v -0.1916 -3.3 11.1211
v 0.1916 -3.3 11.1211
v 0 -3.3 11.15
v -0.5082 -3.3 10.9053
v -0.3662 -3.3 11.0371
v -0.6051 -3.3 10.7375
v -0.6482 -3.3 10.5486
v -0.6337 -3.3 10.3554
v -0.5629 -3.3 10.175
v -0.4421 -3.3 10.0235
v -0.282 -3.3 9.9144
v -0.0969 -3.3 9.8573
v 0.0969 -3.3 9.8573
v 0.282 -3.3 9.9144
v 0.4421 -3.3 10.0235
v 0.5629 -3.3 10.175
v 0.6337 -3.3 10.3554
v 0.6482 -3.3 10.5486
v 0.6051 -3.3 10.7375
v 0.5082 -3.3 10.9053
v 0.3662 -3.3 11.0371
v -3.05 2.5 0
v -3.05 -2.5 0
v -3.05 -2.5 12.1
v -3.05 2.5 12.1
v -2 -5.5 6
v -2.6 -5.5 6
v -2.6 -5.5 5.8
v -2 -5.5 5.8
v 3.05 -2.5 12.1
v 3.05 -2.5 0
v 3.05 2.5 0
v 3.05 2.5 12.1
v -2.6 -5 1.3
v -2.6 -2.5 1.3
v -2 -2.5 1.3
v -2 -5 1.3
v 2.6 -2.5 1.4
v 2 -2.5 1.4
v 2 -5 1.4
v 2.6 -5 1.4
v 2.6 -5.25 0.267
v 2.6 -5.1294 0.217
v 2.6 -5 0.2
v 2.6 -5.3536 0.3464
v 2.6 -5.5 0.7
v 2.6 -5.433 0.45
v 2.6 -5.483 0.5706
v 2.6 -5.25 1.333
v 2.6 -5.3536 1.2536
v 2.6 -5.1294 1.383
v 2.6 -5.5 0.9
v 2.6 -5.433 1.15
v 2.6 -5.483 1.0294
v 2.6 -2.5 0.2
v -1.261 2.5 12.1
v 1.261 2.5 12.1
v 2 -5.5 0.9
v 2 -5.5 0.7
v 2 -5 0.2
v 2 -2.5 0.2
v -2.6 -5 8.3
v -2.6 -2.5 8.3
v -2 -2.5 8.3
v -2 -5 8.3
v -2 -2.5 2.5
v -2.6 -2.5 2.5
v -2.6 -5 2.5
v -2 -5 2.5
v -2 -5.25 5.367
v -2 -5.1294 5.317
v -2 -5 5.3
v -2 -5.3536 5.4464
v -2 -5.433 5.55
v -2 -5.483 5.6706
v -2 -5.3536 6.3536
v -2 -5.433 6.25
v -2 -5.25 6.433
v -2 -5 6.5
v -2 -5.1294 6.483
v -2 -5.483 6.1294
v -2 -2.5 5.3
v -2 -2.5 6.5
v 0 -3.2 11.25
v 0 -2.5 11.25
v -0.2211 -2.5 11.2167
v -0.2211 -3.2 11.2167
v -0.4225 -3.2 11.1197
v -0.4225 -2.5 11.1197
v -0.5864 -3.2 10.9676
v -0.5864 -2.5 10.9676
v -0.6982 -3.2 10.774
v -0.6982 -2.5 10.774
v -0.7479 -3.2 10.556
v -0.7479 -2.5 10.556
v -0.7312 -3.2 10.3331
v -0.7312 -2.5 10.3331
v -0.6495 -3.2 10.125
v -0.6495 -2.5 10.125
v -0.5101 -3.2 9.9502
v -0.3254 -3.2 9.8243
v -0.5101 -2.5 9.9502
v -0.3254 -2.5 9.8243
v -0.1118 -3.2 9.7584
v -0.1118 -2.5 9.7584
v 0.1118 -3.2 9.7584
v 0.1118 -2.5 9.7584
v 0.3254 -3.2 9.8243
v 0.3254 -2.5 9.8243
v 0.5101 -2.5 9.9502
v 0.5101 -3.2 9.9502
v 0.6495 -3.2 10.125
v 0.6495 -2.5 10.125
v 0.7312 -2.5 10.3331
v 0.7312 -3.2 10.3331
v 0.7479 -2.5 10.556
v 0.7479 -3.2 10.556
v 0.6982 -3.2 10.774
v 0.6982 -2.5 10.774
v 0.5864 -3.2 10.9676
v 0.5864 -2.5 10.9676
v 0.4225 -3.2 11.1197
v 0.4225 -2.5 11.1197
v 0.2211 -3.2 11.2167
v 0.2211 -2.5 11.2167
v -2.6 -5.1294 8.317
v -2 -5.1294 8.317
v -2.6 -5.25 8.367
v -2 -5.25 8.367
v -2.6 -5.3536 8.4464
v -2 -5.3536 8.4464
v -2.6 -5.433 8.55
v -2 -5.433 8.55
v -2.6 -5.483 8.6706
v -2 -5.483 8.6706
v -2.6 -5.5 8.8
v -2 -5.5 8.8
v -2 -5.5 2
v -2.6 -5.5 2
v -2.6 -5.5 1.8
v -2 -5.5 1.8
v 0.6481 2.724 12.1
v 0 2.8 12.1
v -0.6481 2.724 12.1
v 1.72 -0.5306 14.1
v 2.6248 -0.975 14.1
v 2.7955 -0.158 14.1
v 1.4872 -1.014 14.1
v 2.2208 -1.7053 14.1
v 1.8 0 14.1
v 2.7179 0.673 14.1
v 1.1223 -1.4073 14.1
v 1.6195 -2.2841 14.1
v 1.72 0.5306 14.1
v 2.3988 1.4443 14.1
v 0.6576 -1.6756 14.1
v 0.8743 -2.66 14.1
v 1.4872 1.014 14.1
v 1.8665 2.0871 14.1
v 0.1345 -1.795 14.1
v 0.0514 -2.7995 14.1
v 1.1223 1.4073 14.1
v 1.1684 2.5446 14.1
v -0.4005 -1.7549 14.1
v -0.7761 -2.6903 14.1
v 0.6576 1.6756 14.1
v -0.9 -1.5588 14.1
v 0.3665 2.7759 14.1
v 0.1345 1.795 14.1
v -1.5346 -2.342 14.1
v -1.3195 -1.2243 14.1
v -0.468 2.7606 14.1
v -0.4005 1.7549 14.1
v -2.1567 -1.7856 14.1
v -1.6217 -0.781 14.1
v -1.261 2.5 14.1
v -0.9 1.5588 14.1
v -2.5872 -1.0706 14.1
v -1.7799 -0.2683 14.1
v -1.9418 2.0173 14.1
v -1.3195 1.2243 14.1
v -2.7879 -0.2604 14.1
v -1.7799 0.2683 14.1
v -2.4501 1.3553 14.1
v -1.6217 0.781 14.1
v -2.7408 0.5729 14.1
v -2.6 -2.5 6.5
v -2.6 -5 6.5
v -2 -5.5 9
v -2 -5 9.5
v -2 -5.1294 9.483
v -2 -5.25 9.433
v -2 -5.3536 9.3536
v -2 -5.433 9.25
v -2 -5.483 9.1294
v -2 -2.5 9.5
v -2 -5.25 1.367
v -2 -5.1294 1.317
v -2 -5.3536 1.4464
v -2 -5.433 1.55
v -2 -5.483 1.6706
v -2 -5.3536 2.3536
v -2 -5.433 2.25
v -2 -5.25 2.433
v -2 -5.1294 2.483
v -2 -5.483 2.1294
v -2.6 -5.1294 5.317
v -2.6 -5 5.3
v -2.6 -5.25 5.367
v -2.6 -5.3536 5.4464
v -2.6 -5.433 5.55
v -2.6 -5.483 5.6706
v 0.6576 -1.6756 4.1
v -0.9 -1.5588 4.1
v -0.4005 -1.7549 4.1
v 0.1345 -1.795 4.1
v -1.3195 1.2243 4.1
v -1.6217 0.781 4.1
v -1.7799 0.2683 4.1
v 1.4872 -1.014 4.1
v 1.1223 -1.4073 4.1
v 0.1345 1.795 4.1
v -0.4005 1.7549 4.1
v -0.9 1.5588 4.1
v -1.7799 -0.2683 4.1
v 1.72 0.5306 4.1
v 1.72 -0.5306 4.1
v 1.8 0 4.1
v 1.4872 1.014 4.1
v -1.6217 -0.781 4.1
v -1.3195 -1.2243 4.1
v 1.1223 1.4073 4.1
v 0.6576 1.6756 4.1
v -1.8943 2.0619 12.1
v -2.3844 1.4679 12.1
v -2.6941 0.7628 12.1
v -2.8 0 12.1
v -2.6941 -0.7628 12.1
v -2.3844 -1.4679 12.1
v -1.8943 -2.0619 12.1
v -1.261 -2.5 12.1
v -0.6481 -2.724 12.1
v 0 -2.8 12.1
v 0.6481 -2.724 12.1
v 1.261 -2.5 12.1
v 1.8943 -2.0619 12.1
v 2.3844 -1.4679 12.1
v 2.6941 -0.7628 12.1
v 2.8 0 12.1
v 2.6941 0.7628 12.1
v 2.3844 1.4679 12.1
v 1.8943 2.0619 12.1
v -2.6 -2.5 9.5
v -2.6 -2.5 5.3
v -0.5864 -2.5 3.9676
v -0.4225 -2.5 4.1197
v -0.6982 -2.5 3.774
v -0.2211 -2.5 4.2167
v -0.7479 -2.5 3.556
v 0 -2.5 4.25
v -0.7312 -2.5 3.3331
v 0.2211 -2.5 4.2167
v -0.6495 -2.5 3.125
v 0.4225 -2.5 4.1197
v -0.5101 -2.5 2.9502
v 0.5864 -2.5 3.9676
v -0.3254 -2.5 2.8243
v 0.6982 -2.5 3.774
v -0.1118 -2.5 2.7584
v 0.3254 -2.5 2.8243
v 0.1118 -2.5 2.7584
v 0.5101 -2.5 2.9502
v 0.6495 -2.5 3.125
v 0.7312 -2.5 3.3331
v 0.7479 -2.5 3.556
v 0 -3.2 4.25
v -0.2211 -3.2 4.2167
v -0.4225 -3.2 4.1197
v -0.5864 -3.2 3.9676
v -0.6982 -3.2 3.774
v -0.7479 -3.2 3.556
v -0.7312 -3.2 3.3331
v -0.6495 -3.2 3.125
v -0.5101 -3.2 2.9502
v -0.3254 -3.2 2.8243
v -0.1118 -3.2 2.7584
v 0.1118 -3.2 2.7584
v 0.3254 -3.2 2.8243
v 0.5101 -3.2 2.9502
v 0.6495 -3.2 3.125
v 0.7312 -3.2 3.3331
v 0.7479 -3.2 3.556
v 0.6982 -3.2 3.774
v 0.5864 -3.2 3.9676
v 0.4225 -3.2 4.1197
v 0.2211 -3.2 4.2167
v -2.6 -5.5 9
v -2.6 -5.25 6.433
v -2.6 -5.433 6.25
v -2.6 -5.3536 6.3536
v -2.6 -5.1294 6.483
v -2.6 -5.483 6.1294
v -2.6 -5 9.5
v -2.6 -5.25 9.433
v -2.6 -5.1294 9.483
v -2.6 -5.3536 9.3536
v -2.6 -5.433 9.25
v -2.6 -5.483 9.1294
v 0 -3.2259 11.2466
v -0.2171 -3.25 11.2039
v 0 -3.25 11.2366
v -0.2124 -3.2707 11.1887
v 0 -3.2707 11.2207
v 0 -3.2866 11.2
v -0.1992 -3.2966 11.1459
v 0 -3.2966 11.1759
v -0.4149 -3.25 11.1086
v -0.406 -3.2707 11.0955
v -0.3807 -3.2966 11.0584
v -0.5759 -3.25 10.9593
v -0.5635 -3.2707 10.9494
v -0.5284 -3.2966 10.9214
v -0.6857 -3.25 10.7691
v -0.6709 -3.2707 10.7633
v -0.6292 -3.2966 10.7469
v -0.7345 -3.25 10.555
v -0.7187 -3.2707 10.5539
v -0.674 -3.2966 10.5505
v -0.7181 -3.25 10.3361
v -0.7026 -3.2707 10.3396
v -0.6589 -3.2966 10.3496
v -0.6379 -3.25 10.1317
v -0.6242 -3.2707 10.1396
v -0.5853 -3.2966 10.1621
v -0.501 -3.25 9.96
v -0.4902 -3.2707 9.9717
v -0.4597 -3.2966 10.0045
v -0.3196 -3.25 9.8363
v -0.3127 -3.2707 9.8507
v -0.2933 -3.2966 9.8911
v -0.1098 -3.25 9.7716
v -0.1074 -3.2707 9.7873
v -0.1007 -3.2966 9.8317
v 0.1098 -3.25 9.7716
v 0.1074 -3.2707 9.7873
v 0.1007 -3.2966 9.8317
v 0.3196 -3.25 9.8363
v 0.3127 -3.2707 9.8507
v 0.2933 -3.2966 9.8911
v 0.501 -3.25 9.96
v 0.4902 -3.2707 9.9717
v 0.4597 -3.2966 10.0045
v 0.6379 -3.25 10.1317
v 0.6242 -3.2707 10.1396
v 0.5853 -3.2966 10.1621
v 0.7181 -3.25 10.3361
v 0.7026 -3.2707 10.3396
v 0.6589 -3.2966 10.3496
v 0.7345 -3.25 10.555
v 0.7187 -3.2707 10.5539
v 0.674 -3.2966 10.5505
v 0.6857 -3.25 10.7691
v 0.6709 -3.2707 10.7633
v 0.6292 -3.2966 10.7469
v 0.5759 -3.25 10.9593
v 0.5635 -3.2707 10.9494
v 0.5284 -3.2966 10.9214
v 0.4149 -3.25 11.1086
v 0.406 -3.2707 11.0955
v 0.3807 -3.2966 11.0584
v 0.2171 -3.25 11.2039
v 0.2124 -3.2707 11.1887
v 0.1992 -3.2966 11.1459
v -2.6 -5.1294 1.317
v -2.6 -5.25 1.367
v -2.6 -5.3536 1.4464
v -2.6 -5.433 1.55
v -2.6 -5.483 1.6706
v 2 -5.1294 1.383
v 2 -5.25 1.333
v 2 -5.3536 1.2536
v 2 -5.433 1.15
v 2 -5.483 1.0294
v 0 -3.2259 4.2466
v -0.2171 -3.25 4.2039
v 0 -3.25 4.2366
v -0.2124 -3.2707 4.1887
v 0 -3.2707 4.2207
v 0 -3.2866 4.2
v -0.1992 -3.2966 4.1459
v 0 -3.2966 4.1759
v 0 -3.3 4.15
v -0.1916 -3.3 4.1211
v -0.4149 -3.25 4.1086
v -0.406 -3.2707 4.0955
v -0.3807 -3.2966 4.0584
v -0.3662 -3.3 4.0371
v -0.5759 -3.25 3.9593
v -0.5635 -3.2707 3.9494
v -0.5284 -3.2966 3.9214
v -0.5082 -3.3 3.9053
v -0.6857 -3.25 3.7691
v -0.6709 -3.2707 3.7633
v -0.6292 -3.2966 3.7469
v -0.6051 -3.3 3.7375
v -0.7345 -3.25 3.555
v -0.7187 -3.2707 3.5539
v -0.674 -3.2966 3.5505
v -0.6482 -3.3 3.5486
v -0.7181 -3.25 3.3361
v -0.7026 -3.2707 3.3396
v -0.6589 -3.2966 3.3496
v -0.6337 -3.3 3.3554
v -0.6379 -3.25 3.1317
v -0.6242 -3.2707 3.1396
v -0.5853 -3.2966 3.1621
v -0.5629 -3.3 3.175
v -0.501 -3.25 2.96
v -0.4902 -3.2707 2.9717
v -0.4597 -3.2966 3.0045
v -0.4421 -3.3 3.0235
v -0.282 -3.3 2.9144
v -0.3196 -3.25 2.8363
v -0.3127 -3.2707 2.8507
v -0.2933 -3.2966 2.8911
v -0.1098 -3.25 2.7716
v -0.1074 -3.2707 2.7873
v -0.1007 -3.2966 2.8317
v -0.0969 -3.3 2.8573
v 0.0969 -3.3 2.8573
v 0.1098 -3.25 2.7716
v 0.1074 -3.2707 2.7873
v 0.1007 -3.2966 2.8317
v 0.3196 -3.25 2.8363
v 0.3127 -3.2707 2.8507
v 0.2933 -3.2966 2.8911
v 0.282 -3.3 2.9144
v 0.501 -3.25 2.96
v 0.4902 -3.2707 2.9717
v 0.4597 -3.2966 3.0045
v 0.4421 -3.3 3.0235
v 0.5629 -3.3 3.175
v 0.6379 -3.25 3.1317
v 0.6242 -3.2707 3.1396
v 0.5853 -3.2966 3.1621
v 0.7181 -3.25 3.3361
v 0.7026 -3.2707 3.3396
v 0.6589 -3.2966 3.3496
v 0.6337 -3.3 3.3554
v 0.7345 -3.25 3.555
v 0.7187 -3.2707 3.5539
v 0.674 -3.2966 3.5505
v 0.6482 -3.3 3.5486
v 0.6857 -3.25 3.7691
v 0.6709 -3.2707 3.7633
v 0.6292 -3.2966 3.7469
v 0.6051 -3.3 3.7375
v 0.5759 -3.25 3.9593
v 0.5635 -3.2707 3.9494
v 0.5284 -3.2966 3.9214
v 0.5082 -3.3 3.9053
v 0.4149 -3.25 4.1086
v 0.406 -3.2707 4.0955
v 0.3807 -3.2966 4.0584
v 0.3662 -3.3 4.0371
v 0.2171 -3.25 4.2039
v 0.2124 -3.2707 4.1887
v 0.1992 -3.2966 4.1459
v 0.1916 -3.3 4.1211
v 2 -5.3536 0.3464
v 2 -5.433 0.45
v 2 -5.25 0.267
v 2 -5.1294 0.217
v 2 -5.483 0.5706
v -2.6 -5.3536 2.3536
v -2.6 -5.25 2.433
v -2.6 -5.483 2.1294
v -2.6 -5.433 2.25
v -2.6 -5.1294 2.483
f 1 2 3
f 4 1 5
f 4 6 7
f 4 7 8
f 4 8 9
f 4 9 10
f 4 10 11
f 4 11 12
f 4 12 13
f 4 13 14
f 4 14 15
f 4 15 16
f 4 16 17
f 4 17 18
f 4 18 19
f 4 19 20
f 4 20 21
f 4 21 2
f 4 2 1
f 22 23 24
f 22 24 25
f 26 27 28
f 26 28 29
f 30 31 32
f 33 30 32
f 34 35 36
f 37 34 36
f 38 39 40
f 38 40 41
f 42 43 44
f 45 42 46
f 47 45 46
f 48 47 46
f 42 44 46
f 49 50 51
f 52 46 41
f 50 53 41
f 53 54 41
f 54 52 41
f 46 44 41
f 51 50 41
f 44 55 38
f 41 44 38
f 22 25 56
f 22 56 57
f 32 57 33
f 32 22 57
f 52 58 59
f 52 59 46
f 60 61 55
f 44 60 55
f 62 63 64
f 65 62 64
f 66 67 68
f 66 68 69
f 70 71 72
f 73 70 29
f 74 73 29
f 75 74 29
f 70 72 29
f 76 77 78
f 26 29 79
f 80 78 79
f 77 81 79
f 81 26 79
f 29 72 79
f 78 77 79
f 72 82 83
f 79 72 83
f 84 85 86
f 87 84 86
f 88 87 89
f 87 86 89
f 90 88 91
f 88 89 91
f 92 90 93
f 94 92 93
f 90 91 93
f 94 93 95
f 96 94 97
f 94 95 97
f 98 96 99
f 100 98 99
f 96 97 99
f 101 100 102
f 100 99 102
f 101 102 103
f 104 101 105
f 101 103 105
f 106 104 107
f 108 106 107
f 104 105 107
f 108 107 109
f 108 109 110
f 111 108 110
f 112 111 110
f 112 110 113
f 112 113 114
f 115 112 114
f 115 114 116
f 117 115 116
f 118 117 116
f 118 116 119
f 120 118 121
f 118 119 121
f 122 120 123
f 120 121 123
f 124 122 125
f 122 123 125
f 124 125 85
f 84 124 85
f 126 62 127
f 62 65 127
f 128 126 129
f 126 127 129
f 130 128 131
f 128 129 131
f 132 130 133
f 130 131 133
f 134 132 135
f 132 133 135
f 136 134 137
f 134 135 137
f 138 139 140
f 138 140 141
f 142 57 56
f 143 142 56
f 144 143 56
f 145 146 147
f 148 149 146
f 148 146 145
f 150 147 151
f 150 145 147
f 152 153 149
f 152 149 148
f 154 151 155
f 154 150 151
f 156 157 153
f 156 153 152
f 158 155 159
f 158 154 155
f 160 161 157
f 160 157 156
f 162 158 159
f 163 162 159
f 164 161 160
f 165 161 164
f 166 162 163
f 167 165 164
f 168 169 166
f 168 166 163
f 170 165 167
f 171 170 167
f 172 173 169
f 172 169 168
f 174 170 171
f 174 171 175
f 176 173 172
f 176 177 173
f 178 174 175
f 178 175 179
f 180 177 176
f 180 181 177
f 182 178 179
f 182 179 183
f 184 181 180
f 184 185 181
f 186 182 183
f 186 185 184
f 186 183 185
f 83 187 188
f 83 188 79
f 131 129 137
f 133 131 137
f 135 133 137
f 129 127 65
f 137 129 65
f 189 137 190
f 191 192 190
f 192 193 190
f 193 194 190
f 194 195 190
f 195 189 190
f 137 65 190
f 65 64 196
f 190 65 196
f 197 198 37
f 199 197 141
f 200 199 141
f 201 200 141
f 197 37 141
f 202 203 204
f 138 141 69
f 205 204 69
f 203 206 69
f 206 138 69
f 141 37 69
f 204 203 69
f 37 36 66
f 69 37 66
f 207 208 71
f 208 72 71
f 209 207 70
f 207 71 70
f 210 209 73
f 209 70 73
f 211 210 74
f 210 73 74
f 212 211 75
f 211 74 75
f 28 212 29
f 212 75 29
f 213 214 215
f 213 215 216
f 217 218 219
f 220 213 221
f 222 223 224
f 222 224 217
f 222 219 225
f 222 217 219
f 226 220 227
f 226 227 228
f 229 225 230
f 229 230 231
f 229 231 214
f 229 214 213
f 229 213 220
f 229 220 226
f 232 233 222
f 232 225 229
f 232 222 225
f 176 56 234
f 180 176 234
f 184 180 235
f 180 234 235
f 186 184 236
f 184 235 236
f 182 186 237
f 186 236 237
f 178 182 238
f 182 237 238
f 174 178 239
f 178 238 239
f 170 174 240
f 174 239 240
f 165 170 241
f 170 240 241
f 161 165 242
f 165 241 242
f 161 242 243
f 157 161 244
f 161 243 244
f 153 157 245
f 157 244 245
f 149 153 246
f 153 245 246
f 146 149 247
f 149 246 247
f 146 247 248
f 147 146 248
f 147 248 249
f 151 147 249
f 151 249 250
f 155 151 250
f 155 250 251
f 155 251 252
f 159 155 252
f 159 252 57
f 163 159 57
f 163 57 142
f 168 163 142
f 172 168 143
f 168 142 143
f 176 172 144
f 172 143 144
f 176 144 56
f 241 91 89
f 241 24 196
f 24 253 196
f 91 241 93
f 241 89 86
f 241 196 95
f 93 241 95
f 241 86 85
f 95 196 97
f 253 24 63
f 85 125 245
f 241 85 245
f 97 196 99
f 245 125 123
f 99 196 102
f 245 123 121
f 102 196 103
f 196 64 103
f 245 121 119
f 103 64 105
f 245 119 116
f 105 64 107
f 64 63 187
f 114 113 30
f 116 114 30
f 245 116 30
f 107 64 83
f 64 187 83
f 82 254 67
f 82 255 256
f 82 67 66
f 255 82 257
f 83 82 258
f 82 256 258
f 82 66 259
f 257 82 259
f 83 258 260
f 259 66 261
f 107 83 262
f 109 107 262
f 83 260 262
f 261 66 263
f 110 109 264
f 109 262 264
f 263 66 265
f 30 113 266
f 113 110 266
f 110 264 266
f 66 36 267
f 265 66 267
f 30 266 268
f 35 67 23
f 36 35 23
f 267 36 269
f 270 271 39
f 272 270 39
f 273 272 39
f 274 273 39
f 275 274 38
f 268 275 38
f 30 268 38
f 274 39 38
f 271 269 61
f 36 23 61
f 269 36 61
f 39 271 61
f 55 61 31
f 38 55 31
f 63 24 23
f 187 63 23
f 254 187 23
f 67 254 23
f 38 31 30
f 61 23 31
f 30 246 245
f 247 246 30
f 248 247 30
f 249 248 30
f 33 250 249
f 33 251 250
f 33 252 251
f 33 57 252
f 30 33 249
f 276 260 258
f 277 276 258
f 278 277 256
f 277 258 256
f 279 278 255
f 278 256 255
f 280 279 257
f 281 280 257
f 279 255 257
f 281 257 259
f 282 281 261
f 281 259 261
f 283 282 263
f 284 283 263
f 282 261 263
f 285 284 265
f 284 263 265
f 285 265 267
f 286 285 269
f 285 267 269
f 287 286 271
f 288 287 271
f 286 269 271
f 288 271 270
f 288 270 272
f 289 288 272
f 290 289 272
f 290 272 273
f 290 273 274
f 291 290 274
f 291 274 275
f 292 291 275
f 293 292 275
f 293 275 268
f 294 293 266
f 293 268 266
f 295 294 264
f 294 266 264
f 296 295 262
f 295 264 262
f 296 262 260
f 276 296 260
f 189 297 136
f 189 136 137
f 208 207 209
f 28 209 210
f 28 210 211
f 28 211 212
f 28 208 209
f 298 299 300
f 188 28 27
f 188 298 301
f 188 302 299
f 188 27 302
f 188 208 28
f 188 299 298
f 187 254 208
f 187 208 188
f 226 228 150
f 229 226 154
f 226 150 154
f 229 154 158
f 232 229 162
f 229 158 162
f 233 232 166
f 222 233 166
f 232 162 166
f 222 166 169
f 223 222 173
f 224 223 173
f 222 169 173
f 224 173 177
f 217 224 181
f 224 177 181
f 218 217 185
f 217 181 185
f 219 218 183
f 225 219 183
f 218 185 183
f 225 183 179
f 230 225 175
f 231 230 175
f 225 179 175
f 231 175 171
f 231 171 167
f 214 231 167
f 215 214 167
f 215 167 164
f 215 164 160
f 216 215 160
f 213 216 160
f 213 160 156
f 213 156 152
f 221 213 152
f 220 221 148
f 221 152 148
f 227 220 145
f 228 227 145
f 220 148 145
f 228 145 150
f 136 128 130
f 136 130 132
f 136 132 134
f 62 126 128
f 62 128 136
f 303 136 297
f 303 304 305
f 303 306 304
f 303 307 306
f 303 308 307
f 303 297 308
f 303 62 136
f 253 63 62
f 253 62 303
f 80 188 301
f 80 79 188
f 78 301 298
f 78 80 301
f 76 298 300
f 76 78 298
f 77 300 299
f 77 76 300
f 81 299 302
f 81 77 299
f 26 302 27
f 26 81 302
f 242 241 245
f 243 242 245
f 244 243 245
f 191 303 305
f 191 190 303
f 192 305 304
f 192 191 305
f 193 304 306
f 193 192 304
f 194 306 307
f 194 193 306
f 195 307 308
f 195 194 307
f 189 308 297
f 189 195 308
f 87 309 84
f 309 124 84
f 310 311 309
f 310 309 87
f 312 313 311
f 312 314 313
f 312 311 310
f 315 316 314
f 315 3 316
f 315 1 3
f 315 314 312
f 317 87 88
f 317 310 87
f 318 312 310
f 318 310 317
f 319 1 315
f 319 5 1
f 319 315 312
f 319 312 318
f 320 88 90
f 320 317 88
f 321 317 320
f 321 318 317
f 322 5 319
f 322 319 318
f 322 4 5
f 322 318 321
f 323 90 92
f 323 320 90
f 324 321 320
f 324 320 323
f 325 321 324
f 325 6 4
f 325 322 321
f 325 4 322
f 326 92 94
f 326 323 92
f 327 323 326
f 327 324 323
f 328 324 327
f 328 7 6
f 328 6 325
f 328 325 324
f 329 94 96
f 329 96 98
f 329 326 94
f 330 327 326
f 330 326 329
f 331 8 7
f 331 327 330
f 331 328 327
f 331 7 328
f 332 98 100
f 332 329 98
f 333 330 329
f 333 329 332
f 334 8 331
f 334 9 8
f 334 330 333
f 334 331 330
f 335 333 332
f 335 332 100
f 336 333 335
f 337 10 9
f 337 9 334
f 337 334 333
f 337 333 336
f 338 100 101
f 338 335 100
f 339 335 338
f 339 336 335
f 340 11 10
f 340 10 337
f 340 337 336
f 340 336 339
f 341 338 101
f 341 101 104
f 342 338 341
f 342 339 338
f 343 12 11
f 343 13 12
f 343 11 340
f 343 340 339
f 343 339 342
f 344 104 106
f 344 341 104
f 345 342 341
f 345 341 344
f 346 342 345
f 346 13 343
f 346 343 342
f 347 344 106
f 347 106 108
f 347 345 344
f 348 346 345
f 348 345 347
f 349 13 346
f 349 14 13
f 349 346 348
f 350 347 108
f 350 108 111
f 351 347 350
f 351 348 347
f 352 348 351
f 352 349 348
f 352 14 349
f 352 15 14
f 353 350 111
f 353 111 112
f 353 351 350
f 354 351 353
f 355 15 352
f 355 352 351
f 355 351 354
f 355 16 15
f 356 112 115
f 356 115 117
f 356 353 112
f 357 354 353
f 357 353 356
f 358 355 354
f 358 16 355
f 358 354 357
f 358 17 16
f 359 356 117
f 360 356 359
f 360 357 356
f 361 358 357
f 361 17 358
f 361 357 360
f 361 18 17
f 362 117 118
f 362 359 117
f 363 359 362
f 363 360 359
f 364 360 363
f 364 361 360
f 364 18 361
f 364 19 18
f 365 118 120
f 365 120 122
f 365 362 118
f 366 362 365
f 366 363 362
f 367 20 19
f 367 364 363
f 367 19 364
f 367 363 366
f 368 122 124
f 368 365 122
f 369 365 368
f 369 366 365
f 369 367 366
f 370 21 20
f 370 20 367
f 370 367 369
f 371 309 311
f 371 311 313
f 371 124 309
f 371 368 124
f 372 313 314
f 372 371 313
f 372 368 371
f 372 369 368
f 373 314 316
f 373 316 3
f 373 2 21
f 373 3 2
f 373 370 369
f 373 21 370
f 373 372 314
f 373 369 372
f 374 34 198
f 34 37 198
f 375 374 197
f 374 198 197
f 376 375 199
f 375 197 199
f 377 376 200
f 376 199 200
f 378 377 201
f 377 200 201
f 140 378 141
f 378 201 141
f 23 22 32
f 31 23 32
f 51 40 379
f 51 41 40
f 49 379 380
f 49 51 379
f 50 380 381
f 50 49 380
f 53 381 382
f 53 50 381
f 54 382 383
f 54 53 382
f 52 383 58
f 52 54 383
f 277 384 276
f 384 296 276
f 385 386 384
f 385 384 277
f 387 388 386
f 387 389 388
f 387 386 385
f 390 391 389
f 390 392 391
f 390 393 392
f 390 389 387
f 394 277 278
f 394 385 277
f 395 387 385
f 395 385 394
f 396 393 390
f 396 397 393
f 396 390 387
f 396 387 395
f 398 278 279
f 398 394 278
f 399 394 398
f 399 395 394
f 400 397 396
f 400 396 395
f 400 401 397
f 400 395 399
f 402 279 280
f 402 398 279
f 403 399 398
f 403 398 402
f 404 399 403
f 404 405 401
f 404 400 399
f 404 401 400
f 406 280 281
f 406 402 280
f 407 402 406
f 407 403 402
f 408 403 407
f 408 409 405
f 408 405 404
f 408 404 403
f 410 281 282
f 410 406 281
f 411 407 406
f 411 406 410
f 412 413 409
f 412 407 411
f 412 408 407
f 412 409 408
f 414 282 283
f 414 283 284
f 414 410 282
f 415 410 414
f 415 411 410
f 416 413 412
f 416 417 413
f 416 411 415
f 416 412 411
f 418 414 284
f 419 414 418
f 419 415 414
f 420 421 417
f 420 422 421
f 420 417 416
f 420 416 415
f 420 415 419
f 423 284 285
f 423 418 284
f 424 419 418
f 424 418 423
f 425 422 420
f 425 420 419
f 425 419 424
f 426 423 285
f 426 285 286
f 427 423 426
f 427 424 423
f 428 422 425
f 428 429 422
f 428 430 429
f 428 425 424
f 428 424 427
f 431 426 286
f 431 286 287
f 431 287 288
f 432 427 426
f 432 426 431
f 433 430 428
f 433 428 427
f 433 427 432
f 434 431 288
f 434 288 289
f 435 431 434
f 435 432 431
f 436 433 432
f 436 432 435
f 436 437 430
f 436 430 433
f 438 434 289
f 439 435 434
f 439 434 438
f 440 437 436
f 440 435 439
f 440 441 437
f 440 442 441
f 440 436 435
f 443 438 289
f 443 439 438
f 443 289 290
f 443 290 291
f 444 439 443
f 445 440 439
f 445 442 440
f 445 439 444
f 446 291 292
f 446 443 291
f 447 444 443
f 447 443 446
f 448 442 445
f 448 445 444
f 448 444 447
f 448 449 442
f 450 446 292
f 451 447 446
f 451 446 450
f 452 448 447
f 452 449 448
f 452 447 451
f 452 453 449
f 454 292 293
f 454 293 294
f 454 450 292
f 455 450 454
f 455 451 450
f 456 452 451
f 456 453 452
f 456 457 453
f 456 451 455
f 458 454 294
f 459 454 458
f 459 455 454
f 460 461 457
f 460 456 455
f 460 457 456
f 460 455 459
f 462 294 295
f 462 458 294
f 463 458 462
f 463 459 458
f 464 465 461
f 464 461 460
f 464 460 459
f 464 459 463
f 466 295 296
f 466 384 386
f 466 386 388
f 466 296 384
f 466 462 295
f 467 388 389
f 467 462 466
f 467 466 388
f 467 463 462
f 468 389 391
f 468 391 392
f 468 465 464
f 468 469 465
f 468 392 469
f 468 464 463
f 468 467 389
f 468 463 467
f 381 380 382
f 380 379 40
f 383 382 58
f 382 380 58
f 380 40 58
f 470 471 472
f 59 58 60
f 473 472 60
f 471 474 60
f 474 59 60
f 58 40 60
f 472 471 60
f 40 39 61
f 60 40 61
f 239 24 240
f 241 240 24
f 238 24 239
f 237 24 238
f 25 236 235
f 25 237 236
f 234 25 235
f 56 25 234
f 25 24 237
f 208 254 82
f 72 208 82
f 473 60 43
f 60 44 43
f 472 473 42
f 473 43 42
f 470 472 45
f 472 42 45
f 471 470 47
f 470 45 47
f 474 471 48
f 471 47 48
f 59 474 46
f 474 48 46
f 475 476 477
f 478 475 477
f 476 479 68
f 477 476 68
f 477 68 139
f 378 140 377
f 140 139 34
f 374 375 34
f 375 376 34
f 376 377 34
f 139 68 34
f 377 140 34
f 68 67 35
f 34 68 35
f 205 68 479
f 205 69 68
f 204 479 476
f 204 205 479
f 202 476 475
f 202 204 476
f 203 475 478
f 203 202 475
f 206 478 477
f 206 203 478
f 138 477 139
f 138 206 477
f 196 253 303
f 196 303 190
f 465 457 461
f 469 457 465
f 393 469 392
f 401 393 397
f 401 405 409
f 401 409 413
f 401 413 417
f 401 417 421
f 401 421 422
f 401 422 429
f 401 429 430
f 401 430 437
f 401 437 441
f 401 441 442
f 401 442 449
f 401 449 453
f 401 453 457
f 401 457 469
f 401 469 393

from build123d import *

# Parameters (mm, degrees)
SKETCH1_W           = 6.1
SKETCH1_H           = 5
BOSS_EXTRUDE1_DEPTH = 12.1
SKETCH2_R           = 2.8
BOSS_EXTRUDE2_DEPTH = 2
SKETCH3_R           = 1.8
CUT_EXTRUDE1_DEPTH  = 10
SKETCH4_R           = 0.75
BOSS_EXTRUDE3_DEPTH = 0.8
SKETCH5_W           = 0.6
SKETCH5_H           = 1.1
SKETCH5_H_2         = 0.1
SKETCH5_H_3         = 1.2
BOSS_EXTRUDE4_DEPTH = 3
FILLET1_R           = 0.5
FILLET2_R           = 0.1


with BuildPart() as part:
    # Sketch1 → Boss-Extrude1 (new body)
    with BuildSketch(Plane.XY):
        Rectangle(SKETCH1_W, SKETCH1_H)
    extrude(amount=BOSS_EXTRUDE1_DEPTH)

    # Sketch2 → Boss-Extrude2 (add)
    with BuildSketch(Plane.XY.offset(12.1)):
        with Locations(Location((0, 0, 0), (0, 0, 116.765500577))):
            Circle(SKETCH2_R)
    extrude(amount=BOSS_EXTRUDE2_DEPTH)

    # Sketch3 → Cut-Extrude1 (cut)
    with BuildSketch(Plane.XY.offset(14.1)):
        Circle(SKETCH3_R)
    extrude(amount=-CUT_EXTRUDE1_DEPTH, mode=Mode.SUBTRACT)

    # Sketch4 → Boss-Extrude3 (add)
    with BuildSketch(Plane.XZ.offset(2.5)):
        with Locations(Location((0, 10.5, 0), (0, 0, 90))):
            Circle(SKETCH4_R)
        with Locations(Location((0, 3.5, 0), (0, 0, 90))):
            Circle(SKETCH4_R)
    extrude(amount=BOSS_EXTRUDE3_DEPTH)

    # Sketch5 → Boss-Extrude4 (add)
    with BuildSketch(Plane.XZ.offset(2.5)):
        with Locations((-2.3, 1.95)):
            Rectangle(SKETCH5_W, SKETCH5_H)
        with Locations((-2.3, 1.35)):
            Rectangle(SKETCH5_W, SKETCH5_H_2)
        with Locations((-2.3, 5.9)):
            Rectangle(SKETCH5_W, SKETCH5_H_3)
        with Locations((2.3, 0.75)):
            Rectangle(SKETCH5_W, SKETCH5_H)
        with Locations((2.3, 1.35)):
            Rectangle(SKETCH5_W, SKETCH5_H_2)
        with Locations((-2.3, 8.9)):
            Rectangle(SKETCH5_W, SKETCH5_H_3)
    extrude(amount=BOSS_EXTRUDE4_DEPTH)

    # Fillet1
    fillet1_edges = [part.edges().sort_by_distance(p)[0] for p in [
        (-2.3, -5.5, 1.3),
        (-2.3, -5.5, 2.5),
        (-2.3, -5.5, 5.3),
        (-2.3, -5.5, 6.5),
        (2.3, -5.5, 0.2),
        (2.3, -5.5, 1.4),
        (-2.3, -5.5, 8.3),
        (-2.3, -5.5, 9.5),
    ]]
    fillet(fillet1_edges, radius=FILLET1_R)

    # Fillet2
    fillet2_edges = [part.edges().sort_by_distance(p)[0] for p in [
        (0, -3.3, 9.75),
        (0, -3.3, 2.75),
    ]]
    fillet(fillet2_edges, radius=FILLET2_R)


solid = part.part
